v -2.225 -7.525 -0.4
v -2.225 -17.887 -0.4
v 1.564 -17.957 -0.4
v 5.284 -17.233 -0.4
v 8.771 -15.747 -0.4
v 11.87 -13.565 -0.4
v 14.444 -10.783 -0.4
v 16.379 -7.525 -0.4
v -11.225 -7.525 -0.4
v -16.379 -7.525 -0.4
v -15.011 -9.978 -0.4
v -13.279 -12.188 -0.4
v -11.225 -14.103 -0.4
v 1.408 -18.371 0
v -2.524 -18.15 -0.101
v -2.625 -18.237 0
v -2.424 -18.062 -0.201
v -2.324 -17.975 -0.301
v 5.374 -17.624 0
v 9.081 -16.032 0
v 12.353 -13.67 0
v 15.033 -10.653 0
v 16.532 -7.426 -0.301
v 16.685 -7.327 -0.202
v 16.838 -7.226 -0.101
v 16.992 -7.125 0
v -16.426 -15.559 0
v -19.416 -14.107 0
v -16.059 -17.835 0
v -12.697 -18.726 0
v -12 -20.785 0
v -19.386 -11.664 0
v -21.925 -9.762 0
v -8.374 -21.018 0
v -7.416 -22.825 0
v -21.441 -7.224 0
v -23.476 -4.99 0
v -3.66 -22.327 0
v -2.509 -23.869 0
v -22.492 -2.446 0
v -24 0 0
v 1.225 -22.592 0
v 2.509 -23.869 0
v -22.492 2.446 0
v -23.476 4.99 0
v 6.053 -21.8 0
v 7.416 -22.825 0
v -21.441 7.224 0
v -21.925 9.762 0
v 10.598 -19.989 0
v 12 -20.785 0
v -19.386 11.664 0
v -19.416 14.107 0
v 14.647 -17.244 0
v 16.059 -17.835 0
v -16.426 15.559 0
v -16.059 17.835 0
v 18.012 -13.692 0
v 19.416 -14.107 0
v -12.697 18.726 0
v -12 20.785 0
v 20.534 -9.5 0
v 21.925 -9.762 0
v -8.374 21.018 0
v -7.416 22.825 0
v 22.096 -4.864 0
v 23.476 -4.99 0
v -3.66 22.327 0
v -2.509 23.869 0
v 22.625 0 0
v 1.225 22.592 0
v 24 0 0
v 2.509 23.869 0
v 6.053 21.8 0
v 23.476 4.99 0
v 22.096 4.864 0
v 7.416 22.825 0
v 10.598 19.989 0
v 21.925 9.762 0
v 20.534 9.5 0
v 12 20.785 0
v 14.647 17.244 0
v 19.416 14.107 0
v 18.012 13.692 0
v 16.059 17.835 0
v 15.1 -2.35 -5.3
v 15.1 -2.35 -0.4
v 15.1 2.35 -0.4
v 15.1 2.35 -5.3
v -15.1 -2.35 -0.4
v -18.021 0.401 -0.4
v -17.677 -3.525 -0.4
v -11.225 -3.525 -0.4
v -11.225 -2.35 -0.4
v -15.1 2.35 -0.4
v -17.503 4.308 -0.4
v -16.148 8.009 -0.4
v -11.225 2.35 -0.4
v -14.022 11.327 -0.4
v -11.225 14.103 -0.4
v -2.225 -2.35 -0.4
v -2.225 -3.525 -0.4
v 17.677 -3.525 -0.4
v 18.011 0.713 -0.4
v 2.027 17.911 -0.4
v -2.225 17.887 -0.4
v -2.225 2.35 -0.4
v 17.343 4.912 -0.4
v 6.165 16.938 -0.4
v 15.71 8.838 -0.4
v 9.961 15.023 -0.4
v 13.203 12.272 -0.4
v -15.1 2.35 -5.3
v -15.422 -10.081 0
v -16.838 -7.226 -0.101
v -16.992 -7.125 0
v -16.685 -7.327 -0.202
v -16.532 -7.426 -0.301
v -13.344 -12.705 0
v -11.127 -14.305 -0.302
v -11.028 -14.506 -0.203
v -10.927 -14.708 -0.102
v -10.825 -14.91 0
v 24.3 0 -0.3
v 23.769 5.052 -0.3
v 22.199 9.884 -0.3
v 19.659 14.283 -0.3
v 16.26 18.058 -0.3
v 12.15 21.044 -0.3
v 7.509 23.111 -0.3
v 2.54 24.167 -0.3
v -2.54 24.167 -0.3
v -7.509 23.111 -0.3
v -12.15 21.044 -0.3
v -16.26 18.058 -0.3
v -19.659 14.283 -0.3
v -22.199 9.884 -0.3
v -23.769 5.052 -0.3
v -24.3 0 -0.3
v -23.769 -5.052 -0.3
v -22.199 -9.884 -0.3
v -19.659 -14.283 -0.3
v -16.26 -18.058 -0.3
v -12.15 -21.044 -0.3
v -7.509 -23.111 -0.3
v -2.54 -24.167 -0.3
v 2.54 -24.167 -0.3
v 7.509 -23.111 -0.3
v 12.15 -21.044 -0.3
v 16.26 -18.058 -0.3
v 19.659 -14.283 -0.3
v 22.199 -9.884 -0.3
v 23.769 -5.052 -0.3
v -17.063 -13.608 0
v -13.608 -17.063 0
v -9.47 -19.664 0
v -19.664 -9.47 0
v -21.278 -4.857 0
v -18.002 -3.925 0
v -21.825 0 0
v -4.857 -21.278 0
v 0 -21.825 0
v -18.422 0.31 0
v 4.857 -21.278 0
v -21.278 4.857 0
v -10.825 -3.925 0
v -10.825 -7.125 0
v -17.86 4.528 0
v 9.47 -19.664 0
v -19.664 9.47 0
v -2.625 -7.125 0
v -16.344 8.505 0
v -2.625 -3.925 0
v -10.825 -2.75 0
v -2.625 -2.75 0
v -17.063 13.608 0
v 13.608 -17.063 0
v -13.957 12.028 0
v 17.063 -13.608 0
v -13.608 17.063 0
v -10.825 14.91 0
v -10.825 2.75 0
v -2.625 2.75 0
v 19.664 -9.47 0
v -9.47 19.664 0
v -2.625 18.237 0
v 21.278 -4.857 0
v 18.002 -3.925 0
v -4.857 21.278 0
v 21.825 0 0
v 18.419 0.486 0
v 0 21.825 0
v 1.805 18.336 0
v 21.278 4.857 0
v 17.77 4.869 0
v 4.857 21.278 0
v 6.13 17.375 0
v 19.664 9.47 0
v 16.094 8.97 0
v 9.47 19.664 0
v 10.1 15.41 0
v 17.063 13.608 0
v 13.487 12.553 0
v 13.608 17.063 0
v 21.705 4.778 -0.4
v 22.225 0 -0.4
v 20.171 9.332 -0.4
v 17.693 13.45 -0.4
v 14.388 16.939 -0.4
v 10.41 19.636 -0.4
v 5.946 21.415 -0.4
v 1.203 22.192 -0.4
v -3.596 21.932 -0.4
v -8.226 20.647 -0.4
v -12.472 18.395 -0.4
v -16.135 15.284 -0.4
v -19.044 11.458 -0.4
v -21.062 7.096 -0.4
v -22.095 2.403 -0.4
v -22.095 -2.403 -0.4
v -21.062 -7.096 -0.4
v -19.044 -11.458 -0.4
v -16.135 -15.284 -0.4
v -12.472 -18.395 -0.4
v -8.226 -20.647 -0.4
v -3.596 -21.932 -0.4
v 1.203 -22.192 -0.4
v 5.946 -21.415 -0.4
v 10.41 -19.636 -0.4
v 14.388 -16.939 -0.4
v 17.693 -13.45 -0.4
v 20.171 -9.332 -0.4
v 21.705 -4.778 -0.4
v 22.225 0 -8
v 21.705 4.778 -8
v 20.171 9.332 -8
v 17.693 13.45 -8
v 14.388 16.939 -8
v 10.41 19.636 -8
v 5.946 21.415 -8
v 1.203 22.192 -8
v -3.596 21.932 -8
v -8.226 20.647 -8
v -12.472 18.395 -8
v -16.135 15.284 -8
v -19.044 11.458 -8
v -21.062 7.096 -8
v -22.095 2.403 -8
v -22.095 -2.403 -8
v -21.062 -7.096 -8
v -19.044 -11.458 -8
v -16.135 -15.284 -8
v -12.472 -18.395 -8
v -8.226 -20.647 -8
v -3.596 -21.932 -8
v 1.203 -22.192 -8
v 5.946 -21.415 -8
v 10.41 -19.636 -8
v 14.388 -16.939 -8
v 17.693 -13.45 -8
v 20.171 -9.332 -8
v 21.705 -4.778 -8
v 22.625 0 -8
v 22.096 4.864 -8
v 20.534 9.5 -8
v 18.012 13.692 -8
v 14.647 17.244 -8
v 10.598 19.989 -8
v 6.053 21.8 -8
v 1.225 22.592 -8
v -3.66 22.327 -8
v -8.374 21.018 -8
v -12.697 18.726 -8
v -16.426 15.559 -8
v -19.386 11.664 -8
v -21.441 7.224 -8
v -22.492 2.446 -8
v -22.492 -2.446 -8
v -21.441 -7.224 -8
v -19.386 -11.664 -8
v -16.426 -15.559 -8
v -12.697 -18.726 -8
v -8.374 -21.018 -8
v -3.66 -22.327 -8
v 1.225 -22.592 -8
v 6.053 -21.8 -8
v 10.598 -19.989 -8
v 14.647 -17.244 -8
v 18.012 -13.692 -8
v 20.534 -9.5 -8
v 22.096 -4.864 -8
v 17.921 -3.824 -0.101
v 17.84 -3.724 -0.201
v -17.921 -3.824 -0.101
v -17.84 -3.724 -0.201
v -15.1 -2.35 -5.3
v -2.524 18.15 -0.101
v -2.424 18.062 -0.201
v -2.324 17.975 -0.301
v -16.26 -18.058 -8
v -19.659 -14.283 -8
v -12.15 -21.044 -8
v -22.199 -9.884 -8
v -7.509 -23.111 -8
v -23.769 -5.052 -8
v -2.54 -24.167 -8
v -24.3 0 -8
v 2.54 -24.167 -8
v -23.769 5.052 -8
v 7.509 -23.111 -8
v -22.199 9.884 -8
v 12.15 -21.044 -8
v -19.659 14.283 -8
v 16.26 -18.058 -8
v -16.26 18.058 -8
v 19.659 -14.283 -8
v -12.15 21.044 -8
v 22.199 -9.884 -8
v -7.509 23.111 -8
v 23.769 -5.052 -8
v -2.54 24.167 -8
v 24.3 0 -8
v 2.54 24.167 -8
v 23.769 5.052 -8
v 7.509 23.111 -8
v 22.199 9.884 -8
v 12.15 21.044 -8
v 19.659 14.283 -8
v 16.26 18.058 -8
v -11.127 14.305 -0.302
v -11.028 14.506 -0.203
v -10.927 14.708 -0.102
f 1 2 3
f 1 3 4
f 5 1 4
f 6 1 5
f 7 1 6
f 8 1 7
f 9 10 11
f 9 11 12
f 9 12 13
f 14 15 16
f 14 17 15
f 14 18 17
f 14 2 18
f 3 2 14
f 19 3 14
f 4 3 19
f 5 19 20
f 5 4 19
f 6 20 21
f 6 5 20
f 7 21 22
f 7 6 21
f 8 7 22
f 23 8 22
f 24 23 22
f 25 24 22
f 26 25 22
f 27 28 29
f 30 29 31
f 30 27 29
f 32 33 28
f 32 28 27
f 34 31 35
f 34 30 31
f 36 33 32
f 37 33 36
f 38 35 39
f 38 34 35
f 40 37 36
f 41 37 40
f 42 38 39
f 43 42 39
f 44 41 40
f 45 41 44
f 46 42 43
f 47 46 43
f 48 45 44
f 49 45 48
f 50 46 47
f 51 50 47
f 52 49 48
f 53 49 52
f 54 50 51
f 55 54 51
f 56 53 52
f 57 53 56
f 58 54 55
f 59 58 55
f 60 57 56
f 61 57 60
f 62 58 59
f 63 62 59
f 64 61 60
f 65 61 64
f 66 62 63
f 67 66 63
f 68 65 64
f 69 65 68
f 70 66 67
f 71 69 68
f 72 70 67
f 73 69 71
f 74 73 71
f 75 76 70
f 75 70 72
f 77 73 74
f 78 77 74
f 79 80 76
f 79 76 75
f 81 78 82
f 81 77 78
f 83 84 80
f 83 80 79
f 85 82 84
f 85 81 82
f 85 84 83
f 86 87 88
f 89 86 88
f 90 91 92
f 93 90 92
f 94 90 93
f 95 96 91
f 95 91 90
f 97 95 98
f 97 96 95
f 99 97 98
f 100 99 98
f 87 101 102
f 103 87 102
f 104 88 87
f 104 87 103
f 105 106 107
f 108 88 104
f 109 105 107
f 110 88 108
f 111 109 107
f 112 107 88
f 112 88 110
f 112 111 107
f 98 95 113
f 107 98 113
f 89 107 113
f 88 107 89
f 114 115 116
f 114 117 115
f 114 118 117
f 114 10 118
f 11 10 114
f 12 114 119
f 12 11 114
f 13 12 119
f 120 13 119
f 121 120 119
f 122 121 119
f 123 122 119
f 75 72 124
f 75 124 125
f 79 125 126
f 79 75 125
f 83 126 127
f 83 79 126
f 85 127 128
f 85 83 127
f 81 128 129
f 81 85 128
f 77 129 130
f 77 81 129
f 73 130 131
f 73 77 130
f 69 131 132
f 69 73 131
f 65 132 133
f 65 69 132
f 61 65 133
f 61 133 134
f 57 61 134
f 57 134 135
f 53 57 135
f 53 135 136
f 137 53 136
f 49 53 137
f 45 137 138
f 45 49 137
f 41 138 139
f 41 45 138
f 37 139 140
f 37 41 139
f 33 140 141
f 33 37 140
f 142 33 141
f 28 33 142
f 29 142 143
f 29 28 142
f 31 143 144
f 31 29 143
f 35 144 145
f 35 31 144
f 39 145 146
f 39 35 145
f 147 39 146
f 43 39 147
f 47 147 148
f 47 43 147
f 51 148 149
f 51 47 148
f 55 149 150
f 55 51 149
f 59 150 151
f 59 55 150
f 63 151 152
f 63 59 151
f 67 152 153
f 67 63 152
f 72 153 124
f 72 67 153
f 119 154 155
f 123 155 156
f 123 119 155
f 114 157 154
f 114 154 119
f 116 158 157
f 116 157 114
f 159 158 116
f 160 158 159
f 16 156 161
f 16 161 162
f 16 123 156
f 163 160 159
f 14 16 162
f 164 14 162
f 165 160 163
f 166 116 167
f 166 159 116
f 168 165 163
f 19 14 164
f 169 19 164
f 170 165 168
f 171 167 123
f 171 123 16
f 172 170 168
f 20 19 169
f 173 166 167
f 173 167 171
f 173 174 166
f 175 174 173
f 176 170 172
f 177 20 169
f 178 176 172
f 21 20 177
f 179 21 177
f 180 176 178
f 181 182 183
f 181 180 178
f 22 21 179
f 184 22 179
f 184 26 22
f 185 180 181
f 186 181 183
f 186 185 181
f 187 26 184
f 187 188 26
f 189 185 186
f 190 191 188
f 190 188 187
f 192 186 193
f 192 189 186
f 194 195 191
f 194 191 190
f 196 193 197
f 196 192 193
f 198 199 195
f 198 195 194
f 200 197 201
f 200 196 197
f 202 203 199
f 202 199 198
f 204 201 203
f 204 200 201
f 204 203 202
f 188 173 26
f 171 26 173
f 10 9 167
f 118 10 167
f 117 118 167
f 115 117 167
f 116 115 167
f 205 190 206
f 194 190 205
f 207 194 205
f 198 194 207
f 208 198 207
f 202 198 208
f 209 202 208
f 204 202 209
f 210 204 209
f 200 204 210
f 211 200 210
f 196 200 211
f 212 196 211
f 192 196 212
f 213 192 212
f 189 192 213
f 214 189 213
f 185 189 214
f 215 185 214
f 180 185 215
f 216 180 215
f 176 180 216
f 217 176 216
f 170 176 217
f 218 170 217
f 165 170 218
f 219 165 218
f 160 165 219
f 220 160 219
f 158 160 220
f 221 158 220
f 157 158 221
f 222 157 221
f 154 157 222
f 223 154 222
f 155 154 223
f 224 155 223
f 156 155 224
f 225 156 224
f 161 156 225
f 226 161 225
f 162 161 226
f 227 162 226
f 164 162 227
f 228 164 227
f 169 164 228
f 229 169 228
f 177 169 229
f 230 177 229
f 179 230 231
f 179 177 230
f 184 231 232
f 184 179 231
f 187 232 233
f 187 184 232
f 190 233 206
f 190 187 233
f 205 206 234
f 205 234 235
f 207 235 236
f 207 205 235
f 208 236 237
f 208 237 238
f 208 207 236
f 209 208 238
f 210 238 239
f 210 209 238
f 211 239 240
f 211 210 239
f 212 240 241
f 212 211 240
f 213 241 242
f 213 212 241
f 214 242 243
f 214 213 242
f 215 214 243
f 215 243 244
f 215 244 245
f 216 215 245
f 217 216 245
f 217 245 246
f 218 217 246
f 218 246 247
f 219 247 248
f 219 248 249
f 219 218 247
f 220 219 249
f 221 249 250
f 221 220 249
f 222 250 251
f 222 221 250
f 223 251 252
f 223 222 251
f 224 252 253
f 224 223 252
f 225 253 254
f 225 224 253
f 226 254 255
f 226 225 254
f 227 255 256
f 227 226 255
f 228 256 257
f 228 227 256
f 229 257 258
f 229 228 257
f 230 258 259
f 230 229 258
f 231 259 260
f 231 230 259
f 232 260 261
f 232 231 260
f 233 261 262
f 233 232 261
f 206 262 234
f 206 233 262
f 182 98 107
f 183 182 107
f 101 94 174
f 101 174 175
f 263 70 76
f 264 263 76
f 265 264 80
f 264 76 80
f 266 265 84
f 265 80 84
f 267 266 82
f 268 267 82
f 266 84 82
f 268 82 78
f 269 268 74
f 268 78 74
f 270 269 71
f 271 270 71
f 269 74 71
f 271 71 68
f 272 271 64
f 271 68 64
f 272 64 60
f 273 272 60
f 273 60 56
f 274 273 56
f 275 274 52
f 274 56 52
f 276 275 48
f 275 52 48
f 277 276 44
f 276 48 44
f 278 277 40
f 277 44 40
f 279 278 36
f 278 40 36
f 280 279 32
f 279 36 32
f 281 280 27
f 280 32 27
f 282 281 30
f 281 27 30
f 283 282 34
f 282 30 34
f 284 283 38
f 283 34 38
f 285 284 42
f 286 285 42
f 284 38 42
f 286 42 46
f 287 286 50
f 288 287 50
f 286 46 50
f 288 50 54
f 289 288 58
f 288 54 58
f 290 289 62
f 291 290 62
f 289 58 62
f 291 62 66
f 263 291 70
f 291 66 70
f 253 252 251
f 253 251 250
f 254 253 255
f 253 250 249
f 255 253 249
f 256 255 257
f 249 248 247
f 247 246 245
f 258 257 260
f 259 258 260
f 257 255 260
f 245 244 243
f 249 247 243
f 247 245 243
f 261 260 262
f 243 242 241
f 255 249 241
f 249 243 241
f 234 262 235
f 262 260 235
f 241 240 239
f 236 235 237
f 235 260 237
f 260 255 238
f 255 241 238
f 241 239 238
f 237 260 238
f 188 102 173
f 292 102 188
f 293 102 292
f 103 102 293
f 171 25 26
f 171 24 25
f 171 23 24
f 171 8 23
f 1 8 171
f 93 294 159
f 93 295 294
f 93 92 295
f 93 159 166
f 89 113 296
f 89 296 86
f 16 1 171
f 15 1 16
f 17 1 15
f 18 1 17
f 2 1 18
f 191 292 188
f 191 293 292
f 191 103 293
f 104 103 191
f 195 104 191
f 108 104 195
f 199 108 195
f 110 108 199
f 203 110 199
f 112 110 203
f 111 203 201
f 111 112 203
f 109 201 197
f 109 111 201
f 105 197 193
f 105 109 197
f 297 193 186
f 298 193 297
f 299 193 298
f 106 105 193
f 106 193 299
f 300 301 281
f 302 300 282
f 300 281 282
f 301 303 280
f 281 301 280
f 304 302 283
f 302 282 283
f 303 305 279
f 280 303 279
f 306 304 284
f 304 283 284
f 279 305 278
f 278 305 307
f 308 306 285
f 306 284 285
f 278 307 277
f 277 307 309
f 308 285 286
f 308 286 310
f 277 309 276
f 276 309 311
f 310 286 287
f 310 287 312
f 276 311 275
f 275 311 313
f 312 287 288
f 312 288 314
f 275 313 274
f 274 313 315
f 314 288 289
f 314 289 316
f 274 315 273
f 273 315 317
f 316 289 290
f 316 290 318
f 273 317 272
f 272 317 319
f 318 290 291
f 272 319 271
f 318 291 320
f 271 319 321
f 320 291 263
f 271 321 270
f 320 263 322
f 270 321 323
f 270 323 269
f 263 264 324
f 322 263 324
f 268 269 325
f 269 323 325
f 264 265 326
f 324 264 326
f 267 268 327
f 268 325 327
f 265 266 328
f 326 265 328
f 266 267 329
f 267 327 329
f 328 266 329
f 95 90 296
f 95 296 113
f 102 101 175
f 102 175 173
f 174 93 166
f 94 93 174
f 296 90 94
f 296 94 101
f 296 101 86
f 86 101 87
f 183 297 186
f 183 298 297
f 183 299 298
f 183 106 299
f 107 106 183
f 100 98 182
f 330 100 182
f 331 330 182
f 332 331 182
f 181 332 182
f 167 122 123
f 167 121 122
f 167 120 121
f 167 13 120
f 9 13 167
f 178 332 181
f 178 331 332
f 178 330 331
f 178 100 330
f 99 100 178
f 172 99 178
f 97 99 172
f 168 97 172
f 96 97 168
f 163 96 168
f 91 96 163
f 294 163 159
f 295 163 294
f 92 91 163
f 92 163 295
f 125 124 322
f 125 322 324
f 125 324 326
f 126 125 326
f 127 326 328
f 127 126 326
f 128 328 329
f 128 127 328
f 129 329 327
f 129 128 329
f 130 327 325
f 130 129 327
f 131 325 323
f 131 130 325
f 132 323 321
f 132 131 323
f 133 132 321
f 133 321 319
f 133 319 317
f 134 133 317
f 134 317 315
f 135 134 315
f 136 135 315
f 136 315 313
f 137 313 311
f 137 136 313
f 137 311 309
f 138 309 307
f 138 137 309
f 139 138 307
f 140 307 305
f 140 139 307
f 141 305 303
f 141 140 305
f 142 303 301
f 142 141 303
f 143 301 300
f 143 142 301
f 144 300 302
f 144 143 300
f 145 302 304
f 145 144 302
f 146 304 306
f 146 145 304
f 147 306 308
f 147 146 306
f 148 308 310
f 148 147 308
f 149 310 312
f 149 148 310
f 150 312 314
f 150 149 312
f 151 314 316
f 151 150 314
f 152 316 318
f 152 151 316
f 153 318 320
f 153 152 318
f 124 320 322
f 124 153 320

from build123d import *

# Parameters (mm, degrees)
F0_R     = 22.225
F1_DEPTH = 8
F2_DEPTH = 0.4
F3_W     = 30.2
F3_H     = 4.7
F4_DEPTH = 5.3
F5_SIZE  = 0.39999
F6_R     = 24.3
F6_R_2   = 22.625
F7_DEPTH = 8
F8_SIZE  = 0.3


# Not quite as in the source:
# - a fillet or chamfer is up to 0.001 mm smaller than in the source, because OpenCascade refuses the exact size


with BuildPart() as f1:
    # F0 (on Top) → F1 (new body)
    with BuildSketch(Plane.XY):
        Circle(F0_R)
        with BuildLine():
            ThreePointArc((-11.225, -14.1031911283), (-14.1885435786, -11.1169175637), (-16.3791025395, -7.525))
            Line((-16.3791025395, -7.525), (-11.225, -7.525))
            Line((-11.225, -7.525), (-11.225, -14.1031911283))
        make_face(mode=Mode.SUBTRACT)
        with BuildLine():
            Line((-2.225, -17.8871462229), (-2.225, -7.525))
            Line((-2.225, -7.525), (16.3791025395, -7.525))
            ThreePointArc((16.3791025395, -7.525), (8.7708707242, -15.7471410656), (-2.225, -17.8871462229))
        make_face(mode=Mode.SUBTRACT)
        with BuildLine():
            ThreePointArc((-17.6769624087, -3.525), (-16.9268762145, 6.1952793817), (-11.225, 14.1031911283))
            Line((-11.225, 14.1031911283), (-11.225, -3.525))
            Line((-11.225, -3.525), (-17.6769624087, -3.525))
        make_face(mode=Mode.SUBTRACT)
        with BuildLine():
            Line((-2.225, -3.525), (-2.225, 17.8871462229))
            ThreePointArc((-2.225, 17.8871462229), (13.2026810549, 12.2715051221), (17.6769624087, -3.525))
            Line((17.6769624087, -3.525), (-2.225, -3.525))
        make_face(mode=Mode.SUBTRACT)
        with BuildLine():
            Line((-11.225, -7.525), (-16.3791025395, -7.525))
            ThreePointArc((-16.3791025395, -7.525), (-14.1885435786, -11.1169175637), (-11.225, -14.1031911283))
            Line((-11.225, -14.1031911283), (-11.225, -7.525))
        make_face()
        with BuildLine():
            Line((-11.225, -3.525), (-11.225, 14.1031911283))
            ThreePointArc((-11.225, 14.1031911283), (-16.9268762145, 6.1952793817), (-17.6769624087, -3.525))
            Line((-17.6769624087, -3.525), (-11.225, -3.525))
        make_face()
        with BuildLine():
            ThreePointArc((17.6769624087, -3.525), (13.2026810549, 12.2715051221), (-2.225, 17.8871462229))
            Line((-2.225, 17.8871462229), (-2.225, -3.525))
            Line((-2.225, -3.525), (17.6769624087, -3.525))
        make_face()
        with BuildLine():
            Line((16.3791025395, -7.525), (-2.225, -7.525))
            Line((-2.225, -7.525), (-2.225, -17.8871462229))
            ThreePointArc((-2.225, -17.8871462229), (8.7708707242, -15.7471410656), (16.3791025395, -7.525))
        make_face()
    extrude(amount=-F1_DEPTH)

    # F0 (on Top) → F2 (cut)
    with BuildSketch(Plane.XY):
        with BuildLine():
            Line((-11.225, -3.525), (-11.225, 14.1031911283))
            ThreePointArc((-11.225, 14.1031911283), (-16.9268762145, 6.1952793817), (-17.6769624087, -3.525))
            Line((-17.6769624087, -3.525), (-11.225, -3.525))
        make_face()
        with BuildLine():
            ThreePointArc((17.6769624087, -3.525), (13.2026810549, 12.2715051221), (-2.225, 17.8871462229))
            Line((-2.225, 17.8871462229), (-2.225, -3.525))
            Line((-2.225, -3.525), (17.6769624087, -3.525))
        make_face()
        with BuildLine():
            Line((16.3791025395, -7.525), (-2.225, -7.525))
            Line((-2.225, -7.525), (-2.225, -17.8871462229))
            ThreePointArc((-2.225, -17.8871462229), (8.7708707242, -15.7471410656), (16.3791025395, -7.525))
        make_face()
        with BuildLine():
            Line((-11.225, -7.525), (-16.3791025395, -7.525))
            ThreePointArc((-16.3791025395, -7.525), (-14.1885435786, -11.1169175637), (-11.225, -14.1031911283))
            Line((-11.225, -14.1031911283), (-11.225, -7.525))
        make_face()
    extrude(amount=-F2_DEPTH, mode=Mode.SUBTRACT)

    # F3 (on Top) → F4 (cut)
    with BuildSketch(Plane.XY):
        Rectangle(F3_W, F3_H)
    extrude(amount=-F4_DEPTH, mode=Mode.SUBTRACT)

    # F5 (size 0.4 in the source; OpenCascade refuses exactly that, so slightly less here)
    f5_edges = [f1.edges().sort_by_distance(p)[0] for p in [
        (-11.225, 8.226596, 0),
        (-16.926876, 6.195279, 0),
        (-14.450981, -3.525, 0),
        (-11.225, -2.9375, 0),
        (13.202681, 12.271505, 0),
        (-2.225, 10.118573, 0),
        (7.725981, -3.525, 0),
        (7.077051, -7.525, 0),
        (8.770871, -15.747141, 0),
        (-2.225, -2.9375, 0),
        (-2.225, -12.706073, 0),
        (-13.802051, -7.525, 0),
        (-14.188544, -11.116918, 0),
        (-11.225, -10.814096, 0),
        (-6.725, 2.35, 0),
        (-6.725, -2.35, 0),
        (-22.225, 0, 0),
    ]]
    chamfer(f5_edges, length=F5_SIZE)


with BuildPart() as f7:
    # F6 (on Top) → F7 (new body, through all)
    with BuildSketch(Plane.XY):
        Circle(F6_R)
        Circle(F6_R_2, mode=Mode.SUBTRACT)
    extrude(amount=-F7_DEPTH)

    # F8
    f8_edges = [f7.edges().sort_by_distance(p)[0] for p in [
        (-24.3, 0, 0),
    ]]
    chamfer(f8_edges, length=F8_SIZE)


solid = Compound([f1.part, f7.part])
